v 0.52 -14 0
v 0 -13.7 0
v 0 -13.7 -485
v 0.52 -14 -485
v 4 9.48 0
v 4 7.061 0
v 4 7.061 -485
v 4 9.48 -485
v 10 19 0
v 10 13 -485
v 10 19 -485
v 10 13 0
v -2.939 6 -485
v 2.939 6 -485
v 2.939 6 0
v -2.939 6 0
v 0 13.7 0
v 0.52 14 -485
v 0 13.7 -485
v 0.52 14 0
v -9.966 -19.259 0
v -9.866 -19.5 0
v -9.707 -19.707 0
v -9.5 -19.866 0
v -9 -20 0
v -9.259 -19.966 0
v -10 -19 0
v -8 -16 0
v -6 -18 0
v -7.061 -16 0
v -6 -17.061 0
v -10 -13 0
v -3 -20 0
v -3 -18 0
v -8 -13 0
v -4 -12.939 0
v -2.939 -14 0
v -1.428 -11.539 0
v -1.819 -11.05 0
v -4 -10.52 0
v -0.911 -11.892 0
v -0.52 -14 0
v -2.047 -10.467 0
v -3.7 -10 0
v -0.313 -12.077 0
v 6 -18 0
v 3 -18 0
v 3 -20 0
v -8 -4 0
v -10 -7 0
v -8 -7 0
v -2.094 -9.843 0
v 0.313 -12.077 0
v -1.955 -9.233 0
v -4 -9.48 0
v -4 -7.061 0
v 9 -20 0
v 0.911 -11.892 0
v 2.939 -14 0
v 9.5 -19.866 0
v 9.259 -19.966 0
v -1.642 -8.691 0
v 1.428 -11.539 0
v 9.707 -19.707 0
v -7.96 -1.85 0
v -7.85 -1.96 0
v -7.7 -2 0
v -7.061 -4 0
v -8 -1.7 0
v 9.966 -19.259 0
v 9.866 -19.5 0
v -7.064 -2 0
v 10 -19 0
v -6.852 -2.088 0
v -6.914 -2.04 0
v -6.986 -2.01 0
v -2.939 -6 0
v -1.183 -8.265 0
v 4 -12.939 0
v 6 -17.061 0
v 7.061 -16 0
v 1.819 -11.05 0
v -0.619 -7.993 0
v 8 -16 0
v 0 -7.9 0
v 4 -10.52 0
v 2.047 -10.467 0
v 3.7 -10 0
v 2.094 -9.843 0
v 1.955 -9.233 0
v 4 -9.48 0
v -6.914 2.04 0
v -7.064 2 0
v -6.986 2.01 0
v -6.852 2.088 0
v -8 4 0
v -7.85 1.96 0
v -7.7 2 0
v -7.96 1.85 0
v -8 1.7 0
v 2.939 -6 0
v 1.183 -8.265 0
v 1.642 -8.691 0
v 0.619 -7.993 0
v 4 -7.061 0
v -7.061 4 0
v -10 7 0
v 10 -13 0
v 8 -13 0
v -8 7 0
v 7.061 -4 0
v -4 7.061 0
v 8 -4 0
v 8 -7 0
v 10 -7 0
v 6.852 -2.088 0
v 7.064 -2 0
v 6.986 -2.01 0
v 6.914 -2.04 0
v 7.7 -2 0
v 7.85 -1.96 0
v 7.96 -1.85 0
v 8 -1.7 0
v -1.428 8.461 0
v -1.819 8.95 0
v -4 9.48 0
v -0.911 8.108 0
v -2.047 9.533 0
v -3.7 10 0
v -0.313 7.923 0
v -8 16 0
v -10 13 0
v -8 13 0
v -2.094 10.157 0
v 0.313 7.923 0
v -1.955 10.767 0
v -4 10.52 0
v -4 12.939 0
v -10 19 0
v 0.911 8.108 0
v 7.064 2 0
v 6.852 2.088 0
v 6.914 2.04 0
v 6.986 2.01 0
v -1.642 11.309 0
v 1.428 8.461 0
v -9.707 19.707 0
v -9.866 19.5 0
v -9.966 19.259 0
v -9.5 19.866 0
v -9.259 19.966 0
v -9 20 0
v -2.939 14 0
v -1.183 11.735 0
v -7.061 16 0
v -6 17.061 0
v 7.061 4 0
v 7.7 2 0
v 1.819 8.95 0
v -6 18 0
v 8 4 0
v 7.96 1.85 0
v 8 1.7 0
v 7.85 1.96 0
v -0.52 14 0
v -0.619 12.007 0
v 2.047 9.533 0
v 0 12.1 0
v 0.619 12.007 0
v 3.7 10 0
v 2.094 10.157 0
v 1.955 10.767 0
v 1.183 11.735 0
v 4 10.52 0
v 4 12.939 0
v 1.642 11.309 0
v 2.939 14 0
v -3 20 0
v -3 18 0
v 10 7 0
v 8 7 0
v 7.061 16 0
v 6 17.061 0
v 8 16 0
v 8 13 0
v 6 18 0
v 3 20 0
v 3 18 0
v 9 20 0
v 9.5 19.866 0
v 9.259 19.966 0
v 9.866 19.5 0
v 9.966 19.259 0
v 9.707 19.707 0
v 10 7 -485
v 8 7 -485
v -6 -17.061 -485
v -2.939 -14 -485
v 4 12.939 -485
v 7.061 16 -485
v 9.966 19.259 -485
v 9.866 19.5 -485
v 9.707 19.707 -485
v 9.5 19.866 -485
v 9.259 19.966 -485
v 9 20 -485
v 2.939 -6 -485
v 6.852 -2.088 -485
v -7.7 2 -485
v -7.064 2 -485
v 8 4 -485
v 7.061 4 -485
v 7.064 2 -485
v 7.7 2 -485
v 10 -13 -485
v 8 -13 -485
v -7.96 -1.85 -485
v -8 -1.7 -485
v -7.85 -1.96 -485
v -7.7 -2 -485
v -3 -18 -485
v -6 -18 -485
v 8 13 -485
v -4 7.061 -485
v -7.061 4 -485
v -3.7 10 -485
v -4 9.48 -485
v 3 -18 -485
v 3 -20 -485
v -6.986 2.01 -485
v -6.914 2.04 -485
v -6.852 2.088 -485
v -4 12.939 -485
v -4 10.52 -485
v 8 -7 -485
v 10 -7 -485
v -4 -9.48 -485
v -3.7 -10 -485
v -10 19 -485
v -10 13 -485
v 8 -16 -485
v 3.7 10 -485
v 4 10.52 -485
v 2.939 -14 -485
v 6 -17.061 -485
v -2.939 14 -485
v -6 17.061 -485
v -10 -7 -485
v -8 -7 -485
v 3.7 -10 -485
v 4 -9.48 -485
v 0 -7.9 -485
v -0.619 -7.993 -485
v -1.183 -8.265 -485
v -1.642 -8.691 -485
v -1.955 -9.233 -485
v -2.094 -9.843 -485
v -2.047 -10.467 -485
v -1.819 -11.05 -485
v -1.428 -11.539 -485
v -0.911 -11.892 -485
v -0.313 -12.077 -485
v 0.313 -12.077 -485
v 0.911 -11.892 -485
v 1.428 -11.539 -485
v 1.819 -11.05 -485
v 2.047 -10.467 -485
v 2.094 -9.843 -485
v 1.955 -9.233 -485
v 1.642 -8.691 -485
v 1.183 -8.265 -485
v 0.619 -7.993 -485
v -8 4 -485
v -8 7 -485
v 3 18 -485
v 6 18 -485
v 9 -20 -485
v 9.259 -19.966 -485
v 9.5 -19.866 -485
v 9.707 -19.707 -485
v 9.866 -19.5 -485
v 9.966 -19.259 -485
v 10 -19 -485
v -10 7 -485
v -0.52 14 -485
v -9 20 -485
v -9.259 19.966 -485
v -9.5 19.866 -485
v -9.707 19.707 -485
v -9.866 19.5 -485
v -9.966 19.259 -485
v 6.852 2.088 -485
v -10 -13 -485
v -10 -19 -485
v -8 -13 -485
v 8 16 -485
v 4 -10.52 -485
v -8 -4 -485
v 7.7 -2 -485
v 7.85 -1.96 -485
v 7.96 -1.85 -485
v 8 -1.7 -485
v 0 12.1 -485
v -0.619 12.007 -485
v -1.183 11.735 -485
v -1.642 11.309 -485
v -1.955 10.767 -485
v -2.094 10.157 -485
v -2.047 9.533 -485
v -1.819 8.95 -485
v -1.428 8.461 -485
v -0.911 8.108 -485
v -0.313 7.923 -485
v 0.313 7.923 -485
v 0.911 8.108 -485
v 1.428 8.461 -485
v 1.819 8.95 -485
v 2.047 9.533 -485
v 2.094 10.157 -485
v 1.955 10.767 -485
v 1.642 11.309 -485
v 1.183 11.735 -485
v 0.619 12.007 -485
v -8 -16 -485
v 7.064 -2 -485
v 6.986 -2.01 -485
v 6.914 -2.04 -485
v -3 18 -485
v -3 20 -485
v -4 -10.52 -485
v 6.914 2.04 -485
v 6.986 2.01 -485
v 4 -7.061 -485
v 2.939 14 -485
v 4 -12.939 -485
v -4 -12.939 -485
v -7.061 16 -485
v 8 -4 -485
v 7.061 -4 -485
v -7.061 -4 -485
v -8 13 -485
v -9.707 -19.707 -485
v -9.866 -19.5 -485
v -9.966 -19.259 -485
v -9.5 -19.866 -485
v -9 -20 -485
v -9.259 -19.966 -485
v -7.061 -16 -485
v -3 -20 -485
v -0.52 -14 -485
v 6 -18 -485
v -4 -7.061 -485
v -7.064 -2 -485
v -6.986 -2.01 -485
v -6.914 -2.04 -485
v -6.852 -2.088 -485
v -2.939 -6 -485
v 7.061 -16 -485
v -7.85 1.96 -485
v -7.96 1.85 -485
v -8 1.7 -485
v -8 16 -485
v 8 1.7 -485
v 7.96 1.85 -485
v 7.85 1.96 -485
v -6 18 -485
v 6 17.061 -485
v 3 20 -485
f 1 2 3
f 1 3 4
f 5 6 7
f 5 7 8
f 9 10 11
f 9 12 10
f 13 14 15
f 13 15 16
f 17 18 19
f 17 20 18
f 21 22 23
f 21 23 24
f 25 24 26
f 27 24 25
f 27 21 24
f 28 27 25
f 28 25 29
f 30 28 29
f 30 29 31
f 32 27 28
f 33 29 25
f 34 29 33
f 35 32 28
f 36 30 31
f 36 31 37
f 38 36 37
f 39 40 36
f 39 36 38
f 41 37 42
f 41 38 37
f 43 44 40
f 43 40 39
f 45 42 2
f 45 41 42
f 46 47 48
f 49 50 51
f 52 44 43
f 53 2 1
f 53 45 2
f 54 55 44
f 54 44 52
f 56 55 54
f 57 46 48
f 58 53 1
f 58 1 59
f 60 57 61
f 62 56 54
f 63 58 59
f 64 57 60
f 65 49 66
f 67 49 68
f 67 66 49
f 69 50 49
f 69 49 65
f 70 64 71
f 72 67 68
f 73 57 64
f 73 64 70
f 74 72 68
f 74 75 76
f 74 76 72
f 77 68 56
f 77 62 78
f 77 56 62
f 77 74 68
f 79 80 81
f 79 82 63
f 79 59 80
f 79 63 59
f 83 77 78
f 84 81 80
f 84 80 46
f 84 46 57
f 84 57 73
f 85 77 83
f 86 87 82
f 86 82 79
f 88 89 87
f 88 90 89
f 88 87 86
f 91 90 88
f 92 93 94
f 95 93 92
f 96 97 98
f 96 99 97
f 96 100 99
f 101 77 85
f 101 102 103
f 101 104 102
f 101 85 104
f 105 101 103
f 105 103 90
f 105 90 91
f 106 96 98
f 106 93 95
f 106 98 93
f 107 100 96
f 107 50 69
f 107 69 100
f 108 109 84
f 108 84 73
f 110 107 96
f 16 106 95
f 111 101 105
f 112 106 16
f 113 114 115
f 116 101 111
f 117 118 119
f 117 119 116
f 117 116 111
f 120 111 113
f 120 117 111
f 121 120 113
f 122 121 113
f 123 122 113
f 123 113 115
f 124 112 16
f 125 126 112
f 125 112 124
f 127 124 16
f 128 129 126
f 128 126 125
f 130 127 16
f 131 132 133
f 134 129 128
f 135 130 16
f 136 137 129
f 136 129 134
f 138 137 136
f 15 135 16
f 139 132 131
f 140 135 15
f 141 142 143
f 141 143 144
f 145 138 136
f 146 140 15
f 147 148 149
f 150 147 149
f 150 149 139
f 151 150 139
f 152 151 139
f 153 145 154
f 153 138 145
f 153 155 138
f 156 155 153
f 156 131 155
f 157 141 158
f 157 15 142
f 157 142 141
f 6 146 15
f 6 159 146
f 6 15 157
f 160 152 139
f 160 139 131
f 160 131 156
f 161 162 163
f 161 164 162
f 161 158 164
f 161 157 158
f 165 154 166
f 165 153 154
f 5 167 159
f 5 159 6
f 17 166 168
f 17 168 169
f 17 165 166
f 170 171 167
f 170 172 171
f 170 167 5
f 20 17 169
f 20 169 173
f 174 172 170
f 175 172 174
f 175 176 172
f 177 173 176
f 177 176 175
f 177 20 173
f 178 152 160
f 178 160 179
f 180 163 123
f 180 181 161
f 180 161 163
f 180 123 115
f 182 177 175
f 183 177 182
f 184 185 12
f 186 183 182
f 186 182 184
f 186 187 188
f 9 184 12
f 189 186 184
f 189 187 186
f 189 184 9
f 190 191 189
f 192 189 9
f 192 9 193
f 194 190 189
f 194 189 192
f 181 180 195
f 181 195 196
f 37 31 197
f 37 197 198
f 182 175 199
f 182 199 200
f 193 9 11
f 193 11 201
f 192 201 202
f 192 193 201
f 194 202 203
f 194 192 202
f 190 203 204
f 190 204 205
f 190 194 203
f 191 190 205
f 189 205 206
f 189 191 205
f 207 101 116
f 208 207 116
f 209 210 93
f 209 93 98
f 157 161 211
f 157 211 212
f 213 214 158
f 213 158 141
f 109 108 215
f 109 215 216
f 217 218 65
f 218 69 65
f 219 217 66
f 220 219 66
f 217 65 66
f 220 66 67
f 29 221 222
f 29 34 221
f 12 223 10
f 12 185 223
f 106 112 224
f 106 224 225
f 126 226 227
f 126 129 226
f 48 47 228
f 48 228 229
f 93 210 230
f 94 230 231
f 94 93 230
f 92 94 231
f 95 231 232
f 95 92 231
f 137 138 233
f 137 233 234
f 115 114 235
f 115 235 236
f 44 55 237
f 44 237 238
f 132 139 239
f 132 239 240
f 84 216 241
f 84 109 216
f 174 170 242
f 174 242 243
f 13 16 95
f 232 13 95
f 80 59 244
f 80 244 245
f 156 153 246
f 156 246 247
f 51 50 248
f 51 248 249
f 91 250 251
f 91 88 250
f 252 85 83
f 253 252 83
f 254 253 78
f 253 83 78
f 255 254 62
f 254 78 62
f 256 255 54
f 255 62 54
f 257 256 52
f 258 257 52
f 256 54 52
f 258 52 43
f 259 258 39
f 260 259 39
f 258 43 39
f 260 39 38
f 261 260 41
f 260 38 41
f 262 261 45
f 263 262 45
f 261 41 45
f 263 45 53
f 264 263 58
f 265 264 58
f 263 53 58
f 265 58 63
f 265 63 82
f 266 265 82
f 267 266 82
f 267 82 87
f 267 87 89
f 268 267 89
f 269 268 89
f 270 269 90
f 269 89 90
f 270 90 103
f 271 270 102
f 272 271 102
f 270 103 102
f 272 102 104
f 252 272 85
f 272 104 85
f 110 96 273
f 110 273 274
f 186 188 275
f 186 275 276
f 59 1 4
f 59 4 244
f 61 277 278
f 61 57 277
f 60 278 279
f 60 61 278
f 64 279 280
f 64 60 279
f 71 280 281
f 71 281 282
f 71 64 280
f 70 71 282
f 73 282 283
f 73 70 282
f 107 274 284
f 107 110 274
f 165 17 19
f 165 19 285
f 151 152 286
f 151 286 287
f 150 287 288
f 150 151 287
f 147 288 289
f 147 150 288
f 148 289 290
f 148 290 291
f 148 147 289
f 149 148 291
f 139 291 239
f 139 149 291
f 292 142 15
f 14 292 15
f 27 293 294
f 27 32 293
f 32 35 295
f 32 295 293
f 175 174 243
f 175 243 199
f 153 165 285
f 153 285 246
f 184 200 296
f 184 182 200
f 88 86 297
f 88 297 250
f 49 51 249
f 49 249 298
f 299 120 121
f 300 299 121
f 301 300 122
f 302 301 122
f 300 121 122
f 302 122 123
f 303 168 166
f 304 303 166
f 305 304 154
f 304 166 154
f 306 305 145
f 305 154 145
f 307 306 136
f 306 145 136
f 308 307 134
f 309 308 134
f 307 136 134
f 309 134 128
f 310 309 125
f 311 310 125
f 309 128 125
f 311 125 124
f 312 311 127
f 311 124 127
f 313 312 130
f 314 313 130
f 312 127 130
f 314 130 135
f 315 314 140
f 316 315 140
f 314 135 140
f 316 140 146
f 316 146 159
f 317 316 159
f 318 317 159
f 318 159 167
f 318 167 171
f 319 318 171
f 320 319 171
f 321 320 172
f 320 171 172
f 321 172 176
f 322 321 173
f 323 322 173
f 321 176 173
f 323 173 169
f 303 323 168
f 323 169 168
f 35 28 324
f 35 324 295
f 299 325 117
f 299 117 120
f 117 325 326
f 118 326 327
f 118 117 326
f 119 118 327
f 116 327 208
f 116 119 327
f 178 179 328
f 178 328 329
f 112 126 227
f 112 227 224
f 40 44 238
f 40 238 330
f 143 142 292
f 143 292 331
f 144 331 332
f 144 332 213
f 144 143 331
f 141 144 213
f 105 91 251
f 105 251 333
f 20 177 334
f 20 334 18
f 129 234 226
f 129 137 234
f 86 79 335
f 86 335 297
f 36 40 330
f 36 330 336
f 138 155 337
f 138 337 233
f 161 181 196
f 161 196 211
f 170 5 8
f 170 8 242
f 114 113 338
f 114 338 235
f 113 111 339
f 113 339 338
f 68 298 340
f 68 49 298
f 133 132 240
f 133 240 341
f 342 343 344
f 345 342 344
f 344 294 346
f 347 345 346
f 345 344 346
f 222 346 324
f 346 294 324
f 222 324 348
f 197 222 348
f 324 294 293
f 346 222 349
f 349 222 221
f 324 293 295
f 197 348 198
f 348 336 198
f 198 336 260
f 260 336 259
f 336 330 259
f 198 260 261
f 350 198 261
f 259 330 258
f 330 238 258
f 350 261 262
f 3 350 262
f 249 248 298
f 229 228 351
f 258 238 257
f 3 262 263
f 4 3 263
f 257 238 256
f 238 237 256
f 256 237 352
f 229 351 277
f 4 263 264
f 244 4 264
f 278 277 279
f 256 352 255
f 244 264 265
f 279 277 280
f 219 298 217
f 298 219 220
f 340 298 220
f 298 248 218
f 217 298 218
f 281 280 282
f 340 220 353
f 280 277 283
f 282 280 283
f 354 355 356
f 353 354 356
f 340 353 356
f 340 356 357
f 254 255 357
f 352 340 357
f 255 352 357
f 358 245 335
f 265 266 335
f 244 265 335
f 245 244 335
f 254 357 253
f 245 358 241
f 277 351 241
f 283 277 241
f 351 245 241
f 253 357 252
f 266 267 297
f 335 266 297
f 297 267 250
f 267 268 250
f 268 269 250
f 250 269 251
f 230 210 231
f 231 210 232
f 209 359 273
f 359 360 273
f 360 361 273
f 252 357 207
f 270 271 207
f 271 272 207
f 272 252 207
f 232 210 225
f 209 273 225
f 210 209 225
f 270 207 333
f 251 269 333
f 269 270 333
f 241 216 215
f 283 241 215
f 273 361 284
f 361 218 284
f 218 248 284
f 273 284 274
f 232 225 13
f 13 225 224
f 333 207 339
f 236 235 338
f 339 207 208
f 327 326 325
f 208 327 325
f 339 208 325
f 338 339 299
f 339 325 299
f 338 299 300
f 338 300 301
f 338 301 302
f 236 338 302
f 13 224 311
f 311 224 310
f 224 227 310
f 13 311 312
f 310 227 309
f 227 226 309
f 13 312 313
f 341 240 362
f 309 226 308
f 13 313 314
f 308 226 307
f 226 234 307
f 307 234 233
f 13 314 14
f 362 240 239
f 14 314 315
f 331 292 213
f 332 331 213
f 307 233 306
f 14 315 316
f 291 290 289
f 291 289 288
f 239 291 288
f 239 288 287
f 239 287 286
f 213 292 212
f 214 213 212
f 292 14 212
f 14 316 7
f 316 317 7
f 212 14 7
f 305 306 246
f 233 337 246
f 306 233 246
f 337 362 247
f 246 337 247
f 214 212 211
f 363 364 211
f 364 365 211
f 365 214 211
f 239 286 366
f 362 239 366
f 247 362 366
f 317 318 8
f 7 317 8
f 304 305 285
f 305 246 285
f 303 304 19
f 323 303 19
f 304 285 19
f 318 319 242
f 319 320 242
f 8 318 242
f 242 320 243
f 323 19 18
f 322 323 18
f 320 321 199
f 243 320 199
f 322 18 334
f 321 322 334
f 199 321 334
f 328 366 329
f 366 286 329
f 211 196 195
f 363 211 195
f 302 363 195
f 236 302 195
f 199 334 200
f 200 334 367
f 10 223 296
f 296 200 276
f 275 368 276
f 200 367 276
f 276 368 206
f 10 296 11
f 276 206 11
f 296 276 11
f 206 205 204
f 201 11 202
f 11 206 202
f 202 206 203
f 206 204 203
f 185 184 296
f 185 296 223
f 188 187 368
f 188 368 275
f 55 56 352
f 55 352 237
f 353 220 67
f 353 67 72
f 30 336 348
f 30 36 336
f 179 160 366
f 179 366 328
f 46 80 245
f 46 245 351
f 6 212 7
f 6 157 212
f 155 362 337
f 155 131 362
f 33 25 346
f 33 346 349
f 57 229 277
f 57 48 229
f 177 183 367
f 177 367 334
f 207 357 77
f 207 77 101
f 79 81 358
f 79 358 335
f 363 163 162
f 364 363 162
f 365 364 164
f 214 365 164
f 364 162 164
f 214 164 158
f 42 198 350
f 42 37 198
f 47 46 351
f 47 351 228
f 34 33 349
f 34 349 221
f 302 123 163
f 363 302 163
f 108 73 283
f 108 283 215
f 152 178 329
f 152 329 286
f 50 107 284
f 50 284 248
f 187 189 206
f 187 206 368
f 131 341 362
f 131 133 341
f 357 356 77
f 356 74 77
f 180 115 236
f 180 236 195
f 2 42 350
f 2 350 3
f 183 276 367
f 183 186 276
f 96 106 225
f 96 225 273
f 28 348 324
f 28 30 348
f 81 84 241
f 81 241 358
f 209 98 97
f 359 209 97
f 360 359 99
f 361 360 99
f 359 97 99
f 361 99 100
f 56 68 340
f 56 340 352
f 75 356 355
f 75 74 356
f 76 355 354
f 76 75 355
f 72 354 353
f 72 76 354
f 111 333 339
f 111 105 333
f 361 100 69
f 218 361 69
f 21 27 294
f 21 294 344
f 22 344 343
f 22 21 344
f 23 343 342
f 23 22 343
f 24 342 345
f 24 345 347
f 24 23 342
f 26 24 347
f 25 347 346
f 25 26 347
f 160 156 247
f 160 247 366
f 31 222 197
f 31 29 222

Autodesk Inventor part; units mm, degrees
sketch "Sketch_1" plane through (0, 0, 0) normal (0, 0, 1) x (1, 0, 0)
  line L0 (-10, -7) -> (-8, -7)
  line L1 (-8, -7) -> (-8, -4)
  line L2 (-8, -4) -> (-7.0607, -4)
  line L3 (-7.0607, -4) -> (-4, -7.0607)
  line L4 (-4, -7.0607) -> (-4, -9.4804)
  line L5 (-4, -9.4804) -> (-3.7, -10)
  line L6 (-3.7, -10) -> (-4, -10.5196)
  line L7 (-4, -10.5196) -> (-4, -12.9393)
  line L8 (-4, -12.9393) -> (-7.0607, -16)
  line L9 (-7.0607, -16) -> (-8, -16)
  line L10 (-8, -16) -> (-8, -13)
  line L11 (-8, -13) -> (-10, -13)
  line L12 (-10, -13) -> (-10, -19)
  arc A0 (-10, -19) -> (-9, -20) centre (-9, -19) ccw
  line L13 (-9, -20) -> (-3, -20)
  line L14 (-3, -20) -> (-3, -18)
  line L15 (-3, -18) -> (-6, -18)
  line L16 (-6, -18) -> (-6, -17.0607)
  line L17 (-6, -17.0607) -> (-2.9393, -14)
  line L18 (-2.9393, -14) -> (-0.5196, -14)
  line L19 (-0.5196, -14) -> (0, -13.7)
  line L20 (0, -13.7) -> (0.5196, -14)
  line L21 (0.5196, -14) -> (2.9393, -14)
  line L22 (2.9393, -14) -> (6, -17.0607)
  line L23 (6, -17.0607) -> (6, -18)
  line L24 (6, -18) -> (3, -18)
  line L25 (3, -18) -> (3, -20)
  line L26 (3, -20) -> (9, -20)
  arc A1 (9, -20) -> (10, -19) centre (9, -19) ccw
  line L27 (10, -19) -> (10, -13)
  line L28 (10, -13) -> (8, -13)
  line L29 (8, -13) -> (8, -16)
  line L30 (8, -16) -> (7.0607, -16)
  line L31 (7.0607, -16) -> (4, -12.9393)
  line L32 (4, -12.9393) -> (4, -10.5196)
  line L33 (4, -10.5196) -> (3.7, -10)
  line L34 (3.7, -10) -> (4, -9.4804)
  line L35 (4, -9.4804) -> (4, -7.0607)
  line L36 (4, -7.0607) -> (7.0607, -4)
  line L37 (7.0607, -4) -> (8, -4)
  line L38 (8, -4) -> (8, -7)
  line L39 (8, -7) -> (10, -7)
  line L40 (10, -7) -> (10, 7)
  line L41 (10, 7) -> (8, 7)
  line L42 (8, 7) -> (8, 4)
  line L43 (8, 4) -> (7.0607, 4)
  line L44 (7.0607, 4) -> (4, 7.0607)
  line L45 (4, 7.0607) -> (4, 9.4804)
  line L46 (4, 9.4804) -> (3.7, 10)
  line L47 (3.7, 10) -> (4, 10.5196)
  line L48 (4, 10.5196) -> (4, 12.9393)
  line L49 (4, 12.9393) -> (7.0607, 16)
  line L50 (7.0607, 16) -> (8, 16)
  line L51 (8, 16) -> (8, 13)
  line L52 (8, 13) -> (10, 13)
  line L53 (10, 13) -> (10, 19)
  arc A2 (10, 19) -> (9, 20) centre (9, 19) ccw
  line L54 (9, 20) -> (3, 20)
  line L55 (3, 20) -> (3, 18)
  line L56 (3, 18) -> (6, 18)
  line L57 (6, 18) -> (6, 17.0607)
  line L58 (6, 17.0607) -> (2.9393, 14)
  line L59 (2.9393, 14) -> (0.5196, 14)
  line L60 (0.5196, 14) -> (0, 13.7)
  line L61 (0, 13.7) -> (-0.5196, 14)
  line L62 (-0.5196, 14) -> (-2.9393, 14)
  line L63 (-2.9393, 14) -> (-6, 17.0607)
  line L64 (-6, 17.0607) -> (-6, 18)
  line L65 (-6, 18) -> (-3, 18)
  line L66 (-3, 18) -> (-3, 20)
  line L67 (-3, 20) -> (-9, 20)
  arc A3 (-9, 20) -> (-10, 19) centre (-9, 19) ccw
  line L68 (-10, 19) -> (-10, 13)
  line L69 (-10, 13) -> (-8, 13)
  line L70 (-8, 13) -> (-8, 16)
  line L71 (-8, 16) -> (-7.0607, 16)
  line L72 (-7.0607, 16) -> (-4, 12.9393)
  line L73 (-4, 12.9393) -> (-4, 10.5196)
  line L74 (-4, 10.5196) -> (-3.7, 10)
  line L75 (-3.7, 10) -> (-4, 9.4804)
  line L76 (-4, 9.4804) -> (-4, 7.0607)
  line L77 (-4, 7.0607) -> (-7.0607, 4)
  line L78 (-7.0607, 4) -> (-8, 4)
  line L79 (-8, 4) -> (-8, 7)
  line L80 (-8, 7) -> (-10, 7)
  line L81 (-10, 7) -> (-10, -7)
  line L82 (-8, 1.7) -> (-8, -1.7)
  arc A4 (-8, -1.7) -> (-7.7, -2) centre (-7.7, -1.7) ccw
  line L83 (-7.7, -2) -> (-7.0636, -2)
  arc A5 (-6.8515, -2.0879) -> (-7.0636, -2) centre (-7.0636, -2.3) ccw
  line L84 (-6.8515, -2.0879) -> (-2.9393, -6)
  line L85 (-2.9393, -6) -> (2.9393, -6)
  line L86 (2.9393, -6) -> (6.8515, -2.0879)
  arc A6 (7.0636, -2) -> (6.8515, -2.0879) centre (7.0636, -2.3) ccw
  line L87 (7.0636, -2) -> (7.7, -2)
  arc A7 (7.7, -2) -> (8, -1.7) centre (7.7, -1.7) ccw
  line L88 (8, -1.7) -> (8, 1.7)
  arc A8 (8, 1.7) -> (7.7, 2) centre (7.7, 1.7) ccw
  line L89 (7.7, 2) -> (7.0636, 2)
  arc A9 (6.8515, 2.0879) -> (7.0636, 2) centre (7.0636, 2.3) ccw
  line L90 (6.8515, 2.0879) -> (2.9393, 6)
  line L91 (2.9393, 6) -> (-2.9393, 6)
  line L92 (-2.9393, 6) -> (-6.8515, 2.0879)
  arc A10 (-7.0636, 2) -> (-6.8515, 2.0879) centre (-7.0636, 2.3) ccw
  line L93 (-7.0636, 2) -> (-7.7, 2)
  arc A11 (-7.7, 2) -> (-8, 1.7) centre (-7.7, 1.7) ccw
extrude "Extrusion1" add sketch "Sketch_1" against normal blind 485
sketch "Sketch2" plane through (0, 0, -485) normal (0, 0, -1) x (-1, 0, 0)
  point P0 (0, 10)
hole "Hole1" at (0, 10, -485) direction (0, 0, 1) diameter 4.2 depth 485
pattern_linear "Rectangular Pattern1" count 2 spacing 20 along (0, -1, 0) of "Hole1"
ref_plane "C1_XY" through (0, 0, 0) normal (0, 0, 1) x (1, 0, 0)
ref_plane "C1_YZ" through (0, 0, 0) normal (1, 0, 0) x (0, 1, 0)
ref_plane "C1_ZX" through (0, 0, 0) normal (0, 1, 0) x (0, 0, 1)
properties part number "HFS5-2040-485"
